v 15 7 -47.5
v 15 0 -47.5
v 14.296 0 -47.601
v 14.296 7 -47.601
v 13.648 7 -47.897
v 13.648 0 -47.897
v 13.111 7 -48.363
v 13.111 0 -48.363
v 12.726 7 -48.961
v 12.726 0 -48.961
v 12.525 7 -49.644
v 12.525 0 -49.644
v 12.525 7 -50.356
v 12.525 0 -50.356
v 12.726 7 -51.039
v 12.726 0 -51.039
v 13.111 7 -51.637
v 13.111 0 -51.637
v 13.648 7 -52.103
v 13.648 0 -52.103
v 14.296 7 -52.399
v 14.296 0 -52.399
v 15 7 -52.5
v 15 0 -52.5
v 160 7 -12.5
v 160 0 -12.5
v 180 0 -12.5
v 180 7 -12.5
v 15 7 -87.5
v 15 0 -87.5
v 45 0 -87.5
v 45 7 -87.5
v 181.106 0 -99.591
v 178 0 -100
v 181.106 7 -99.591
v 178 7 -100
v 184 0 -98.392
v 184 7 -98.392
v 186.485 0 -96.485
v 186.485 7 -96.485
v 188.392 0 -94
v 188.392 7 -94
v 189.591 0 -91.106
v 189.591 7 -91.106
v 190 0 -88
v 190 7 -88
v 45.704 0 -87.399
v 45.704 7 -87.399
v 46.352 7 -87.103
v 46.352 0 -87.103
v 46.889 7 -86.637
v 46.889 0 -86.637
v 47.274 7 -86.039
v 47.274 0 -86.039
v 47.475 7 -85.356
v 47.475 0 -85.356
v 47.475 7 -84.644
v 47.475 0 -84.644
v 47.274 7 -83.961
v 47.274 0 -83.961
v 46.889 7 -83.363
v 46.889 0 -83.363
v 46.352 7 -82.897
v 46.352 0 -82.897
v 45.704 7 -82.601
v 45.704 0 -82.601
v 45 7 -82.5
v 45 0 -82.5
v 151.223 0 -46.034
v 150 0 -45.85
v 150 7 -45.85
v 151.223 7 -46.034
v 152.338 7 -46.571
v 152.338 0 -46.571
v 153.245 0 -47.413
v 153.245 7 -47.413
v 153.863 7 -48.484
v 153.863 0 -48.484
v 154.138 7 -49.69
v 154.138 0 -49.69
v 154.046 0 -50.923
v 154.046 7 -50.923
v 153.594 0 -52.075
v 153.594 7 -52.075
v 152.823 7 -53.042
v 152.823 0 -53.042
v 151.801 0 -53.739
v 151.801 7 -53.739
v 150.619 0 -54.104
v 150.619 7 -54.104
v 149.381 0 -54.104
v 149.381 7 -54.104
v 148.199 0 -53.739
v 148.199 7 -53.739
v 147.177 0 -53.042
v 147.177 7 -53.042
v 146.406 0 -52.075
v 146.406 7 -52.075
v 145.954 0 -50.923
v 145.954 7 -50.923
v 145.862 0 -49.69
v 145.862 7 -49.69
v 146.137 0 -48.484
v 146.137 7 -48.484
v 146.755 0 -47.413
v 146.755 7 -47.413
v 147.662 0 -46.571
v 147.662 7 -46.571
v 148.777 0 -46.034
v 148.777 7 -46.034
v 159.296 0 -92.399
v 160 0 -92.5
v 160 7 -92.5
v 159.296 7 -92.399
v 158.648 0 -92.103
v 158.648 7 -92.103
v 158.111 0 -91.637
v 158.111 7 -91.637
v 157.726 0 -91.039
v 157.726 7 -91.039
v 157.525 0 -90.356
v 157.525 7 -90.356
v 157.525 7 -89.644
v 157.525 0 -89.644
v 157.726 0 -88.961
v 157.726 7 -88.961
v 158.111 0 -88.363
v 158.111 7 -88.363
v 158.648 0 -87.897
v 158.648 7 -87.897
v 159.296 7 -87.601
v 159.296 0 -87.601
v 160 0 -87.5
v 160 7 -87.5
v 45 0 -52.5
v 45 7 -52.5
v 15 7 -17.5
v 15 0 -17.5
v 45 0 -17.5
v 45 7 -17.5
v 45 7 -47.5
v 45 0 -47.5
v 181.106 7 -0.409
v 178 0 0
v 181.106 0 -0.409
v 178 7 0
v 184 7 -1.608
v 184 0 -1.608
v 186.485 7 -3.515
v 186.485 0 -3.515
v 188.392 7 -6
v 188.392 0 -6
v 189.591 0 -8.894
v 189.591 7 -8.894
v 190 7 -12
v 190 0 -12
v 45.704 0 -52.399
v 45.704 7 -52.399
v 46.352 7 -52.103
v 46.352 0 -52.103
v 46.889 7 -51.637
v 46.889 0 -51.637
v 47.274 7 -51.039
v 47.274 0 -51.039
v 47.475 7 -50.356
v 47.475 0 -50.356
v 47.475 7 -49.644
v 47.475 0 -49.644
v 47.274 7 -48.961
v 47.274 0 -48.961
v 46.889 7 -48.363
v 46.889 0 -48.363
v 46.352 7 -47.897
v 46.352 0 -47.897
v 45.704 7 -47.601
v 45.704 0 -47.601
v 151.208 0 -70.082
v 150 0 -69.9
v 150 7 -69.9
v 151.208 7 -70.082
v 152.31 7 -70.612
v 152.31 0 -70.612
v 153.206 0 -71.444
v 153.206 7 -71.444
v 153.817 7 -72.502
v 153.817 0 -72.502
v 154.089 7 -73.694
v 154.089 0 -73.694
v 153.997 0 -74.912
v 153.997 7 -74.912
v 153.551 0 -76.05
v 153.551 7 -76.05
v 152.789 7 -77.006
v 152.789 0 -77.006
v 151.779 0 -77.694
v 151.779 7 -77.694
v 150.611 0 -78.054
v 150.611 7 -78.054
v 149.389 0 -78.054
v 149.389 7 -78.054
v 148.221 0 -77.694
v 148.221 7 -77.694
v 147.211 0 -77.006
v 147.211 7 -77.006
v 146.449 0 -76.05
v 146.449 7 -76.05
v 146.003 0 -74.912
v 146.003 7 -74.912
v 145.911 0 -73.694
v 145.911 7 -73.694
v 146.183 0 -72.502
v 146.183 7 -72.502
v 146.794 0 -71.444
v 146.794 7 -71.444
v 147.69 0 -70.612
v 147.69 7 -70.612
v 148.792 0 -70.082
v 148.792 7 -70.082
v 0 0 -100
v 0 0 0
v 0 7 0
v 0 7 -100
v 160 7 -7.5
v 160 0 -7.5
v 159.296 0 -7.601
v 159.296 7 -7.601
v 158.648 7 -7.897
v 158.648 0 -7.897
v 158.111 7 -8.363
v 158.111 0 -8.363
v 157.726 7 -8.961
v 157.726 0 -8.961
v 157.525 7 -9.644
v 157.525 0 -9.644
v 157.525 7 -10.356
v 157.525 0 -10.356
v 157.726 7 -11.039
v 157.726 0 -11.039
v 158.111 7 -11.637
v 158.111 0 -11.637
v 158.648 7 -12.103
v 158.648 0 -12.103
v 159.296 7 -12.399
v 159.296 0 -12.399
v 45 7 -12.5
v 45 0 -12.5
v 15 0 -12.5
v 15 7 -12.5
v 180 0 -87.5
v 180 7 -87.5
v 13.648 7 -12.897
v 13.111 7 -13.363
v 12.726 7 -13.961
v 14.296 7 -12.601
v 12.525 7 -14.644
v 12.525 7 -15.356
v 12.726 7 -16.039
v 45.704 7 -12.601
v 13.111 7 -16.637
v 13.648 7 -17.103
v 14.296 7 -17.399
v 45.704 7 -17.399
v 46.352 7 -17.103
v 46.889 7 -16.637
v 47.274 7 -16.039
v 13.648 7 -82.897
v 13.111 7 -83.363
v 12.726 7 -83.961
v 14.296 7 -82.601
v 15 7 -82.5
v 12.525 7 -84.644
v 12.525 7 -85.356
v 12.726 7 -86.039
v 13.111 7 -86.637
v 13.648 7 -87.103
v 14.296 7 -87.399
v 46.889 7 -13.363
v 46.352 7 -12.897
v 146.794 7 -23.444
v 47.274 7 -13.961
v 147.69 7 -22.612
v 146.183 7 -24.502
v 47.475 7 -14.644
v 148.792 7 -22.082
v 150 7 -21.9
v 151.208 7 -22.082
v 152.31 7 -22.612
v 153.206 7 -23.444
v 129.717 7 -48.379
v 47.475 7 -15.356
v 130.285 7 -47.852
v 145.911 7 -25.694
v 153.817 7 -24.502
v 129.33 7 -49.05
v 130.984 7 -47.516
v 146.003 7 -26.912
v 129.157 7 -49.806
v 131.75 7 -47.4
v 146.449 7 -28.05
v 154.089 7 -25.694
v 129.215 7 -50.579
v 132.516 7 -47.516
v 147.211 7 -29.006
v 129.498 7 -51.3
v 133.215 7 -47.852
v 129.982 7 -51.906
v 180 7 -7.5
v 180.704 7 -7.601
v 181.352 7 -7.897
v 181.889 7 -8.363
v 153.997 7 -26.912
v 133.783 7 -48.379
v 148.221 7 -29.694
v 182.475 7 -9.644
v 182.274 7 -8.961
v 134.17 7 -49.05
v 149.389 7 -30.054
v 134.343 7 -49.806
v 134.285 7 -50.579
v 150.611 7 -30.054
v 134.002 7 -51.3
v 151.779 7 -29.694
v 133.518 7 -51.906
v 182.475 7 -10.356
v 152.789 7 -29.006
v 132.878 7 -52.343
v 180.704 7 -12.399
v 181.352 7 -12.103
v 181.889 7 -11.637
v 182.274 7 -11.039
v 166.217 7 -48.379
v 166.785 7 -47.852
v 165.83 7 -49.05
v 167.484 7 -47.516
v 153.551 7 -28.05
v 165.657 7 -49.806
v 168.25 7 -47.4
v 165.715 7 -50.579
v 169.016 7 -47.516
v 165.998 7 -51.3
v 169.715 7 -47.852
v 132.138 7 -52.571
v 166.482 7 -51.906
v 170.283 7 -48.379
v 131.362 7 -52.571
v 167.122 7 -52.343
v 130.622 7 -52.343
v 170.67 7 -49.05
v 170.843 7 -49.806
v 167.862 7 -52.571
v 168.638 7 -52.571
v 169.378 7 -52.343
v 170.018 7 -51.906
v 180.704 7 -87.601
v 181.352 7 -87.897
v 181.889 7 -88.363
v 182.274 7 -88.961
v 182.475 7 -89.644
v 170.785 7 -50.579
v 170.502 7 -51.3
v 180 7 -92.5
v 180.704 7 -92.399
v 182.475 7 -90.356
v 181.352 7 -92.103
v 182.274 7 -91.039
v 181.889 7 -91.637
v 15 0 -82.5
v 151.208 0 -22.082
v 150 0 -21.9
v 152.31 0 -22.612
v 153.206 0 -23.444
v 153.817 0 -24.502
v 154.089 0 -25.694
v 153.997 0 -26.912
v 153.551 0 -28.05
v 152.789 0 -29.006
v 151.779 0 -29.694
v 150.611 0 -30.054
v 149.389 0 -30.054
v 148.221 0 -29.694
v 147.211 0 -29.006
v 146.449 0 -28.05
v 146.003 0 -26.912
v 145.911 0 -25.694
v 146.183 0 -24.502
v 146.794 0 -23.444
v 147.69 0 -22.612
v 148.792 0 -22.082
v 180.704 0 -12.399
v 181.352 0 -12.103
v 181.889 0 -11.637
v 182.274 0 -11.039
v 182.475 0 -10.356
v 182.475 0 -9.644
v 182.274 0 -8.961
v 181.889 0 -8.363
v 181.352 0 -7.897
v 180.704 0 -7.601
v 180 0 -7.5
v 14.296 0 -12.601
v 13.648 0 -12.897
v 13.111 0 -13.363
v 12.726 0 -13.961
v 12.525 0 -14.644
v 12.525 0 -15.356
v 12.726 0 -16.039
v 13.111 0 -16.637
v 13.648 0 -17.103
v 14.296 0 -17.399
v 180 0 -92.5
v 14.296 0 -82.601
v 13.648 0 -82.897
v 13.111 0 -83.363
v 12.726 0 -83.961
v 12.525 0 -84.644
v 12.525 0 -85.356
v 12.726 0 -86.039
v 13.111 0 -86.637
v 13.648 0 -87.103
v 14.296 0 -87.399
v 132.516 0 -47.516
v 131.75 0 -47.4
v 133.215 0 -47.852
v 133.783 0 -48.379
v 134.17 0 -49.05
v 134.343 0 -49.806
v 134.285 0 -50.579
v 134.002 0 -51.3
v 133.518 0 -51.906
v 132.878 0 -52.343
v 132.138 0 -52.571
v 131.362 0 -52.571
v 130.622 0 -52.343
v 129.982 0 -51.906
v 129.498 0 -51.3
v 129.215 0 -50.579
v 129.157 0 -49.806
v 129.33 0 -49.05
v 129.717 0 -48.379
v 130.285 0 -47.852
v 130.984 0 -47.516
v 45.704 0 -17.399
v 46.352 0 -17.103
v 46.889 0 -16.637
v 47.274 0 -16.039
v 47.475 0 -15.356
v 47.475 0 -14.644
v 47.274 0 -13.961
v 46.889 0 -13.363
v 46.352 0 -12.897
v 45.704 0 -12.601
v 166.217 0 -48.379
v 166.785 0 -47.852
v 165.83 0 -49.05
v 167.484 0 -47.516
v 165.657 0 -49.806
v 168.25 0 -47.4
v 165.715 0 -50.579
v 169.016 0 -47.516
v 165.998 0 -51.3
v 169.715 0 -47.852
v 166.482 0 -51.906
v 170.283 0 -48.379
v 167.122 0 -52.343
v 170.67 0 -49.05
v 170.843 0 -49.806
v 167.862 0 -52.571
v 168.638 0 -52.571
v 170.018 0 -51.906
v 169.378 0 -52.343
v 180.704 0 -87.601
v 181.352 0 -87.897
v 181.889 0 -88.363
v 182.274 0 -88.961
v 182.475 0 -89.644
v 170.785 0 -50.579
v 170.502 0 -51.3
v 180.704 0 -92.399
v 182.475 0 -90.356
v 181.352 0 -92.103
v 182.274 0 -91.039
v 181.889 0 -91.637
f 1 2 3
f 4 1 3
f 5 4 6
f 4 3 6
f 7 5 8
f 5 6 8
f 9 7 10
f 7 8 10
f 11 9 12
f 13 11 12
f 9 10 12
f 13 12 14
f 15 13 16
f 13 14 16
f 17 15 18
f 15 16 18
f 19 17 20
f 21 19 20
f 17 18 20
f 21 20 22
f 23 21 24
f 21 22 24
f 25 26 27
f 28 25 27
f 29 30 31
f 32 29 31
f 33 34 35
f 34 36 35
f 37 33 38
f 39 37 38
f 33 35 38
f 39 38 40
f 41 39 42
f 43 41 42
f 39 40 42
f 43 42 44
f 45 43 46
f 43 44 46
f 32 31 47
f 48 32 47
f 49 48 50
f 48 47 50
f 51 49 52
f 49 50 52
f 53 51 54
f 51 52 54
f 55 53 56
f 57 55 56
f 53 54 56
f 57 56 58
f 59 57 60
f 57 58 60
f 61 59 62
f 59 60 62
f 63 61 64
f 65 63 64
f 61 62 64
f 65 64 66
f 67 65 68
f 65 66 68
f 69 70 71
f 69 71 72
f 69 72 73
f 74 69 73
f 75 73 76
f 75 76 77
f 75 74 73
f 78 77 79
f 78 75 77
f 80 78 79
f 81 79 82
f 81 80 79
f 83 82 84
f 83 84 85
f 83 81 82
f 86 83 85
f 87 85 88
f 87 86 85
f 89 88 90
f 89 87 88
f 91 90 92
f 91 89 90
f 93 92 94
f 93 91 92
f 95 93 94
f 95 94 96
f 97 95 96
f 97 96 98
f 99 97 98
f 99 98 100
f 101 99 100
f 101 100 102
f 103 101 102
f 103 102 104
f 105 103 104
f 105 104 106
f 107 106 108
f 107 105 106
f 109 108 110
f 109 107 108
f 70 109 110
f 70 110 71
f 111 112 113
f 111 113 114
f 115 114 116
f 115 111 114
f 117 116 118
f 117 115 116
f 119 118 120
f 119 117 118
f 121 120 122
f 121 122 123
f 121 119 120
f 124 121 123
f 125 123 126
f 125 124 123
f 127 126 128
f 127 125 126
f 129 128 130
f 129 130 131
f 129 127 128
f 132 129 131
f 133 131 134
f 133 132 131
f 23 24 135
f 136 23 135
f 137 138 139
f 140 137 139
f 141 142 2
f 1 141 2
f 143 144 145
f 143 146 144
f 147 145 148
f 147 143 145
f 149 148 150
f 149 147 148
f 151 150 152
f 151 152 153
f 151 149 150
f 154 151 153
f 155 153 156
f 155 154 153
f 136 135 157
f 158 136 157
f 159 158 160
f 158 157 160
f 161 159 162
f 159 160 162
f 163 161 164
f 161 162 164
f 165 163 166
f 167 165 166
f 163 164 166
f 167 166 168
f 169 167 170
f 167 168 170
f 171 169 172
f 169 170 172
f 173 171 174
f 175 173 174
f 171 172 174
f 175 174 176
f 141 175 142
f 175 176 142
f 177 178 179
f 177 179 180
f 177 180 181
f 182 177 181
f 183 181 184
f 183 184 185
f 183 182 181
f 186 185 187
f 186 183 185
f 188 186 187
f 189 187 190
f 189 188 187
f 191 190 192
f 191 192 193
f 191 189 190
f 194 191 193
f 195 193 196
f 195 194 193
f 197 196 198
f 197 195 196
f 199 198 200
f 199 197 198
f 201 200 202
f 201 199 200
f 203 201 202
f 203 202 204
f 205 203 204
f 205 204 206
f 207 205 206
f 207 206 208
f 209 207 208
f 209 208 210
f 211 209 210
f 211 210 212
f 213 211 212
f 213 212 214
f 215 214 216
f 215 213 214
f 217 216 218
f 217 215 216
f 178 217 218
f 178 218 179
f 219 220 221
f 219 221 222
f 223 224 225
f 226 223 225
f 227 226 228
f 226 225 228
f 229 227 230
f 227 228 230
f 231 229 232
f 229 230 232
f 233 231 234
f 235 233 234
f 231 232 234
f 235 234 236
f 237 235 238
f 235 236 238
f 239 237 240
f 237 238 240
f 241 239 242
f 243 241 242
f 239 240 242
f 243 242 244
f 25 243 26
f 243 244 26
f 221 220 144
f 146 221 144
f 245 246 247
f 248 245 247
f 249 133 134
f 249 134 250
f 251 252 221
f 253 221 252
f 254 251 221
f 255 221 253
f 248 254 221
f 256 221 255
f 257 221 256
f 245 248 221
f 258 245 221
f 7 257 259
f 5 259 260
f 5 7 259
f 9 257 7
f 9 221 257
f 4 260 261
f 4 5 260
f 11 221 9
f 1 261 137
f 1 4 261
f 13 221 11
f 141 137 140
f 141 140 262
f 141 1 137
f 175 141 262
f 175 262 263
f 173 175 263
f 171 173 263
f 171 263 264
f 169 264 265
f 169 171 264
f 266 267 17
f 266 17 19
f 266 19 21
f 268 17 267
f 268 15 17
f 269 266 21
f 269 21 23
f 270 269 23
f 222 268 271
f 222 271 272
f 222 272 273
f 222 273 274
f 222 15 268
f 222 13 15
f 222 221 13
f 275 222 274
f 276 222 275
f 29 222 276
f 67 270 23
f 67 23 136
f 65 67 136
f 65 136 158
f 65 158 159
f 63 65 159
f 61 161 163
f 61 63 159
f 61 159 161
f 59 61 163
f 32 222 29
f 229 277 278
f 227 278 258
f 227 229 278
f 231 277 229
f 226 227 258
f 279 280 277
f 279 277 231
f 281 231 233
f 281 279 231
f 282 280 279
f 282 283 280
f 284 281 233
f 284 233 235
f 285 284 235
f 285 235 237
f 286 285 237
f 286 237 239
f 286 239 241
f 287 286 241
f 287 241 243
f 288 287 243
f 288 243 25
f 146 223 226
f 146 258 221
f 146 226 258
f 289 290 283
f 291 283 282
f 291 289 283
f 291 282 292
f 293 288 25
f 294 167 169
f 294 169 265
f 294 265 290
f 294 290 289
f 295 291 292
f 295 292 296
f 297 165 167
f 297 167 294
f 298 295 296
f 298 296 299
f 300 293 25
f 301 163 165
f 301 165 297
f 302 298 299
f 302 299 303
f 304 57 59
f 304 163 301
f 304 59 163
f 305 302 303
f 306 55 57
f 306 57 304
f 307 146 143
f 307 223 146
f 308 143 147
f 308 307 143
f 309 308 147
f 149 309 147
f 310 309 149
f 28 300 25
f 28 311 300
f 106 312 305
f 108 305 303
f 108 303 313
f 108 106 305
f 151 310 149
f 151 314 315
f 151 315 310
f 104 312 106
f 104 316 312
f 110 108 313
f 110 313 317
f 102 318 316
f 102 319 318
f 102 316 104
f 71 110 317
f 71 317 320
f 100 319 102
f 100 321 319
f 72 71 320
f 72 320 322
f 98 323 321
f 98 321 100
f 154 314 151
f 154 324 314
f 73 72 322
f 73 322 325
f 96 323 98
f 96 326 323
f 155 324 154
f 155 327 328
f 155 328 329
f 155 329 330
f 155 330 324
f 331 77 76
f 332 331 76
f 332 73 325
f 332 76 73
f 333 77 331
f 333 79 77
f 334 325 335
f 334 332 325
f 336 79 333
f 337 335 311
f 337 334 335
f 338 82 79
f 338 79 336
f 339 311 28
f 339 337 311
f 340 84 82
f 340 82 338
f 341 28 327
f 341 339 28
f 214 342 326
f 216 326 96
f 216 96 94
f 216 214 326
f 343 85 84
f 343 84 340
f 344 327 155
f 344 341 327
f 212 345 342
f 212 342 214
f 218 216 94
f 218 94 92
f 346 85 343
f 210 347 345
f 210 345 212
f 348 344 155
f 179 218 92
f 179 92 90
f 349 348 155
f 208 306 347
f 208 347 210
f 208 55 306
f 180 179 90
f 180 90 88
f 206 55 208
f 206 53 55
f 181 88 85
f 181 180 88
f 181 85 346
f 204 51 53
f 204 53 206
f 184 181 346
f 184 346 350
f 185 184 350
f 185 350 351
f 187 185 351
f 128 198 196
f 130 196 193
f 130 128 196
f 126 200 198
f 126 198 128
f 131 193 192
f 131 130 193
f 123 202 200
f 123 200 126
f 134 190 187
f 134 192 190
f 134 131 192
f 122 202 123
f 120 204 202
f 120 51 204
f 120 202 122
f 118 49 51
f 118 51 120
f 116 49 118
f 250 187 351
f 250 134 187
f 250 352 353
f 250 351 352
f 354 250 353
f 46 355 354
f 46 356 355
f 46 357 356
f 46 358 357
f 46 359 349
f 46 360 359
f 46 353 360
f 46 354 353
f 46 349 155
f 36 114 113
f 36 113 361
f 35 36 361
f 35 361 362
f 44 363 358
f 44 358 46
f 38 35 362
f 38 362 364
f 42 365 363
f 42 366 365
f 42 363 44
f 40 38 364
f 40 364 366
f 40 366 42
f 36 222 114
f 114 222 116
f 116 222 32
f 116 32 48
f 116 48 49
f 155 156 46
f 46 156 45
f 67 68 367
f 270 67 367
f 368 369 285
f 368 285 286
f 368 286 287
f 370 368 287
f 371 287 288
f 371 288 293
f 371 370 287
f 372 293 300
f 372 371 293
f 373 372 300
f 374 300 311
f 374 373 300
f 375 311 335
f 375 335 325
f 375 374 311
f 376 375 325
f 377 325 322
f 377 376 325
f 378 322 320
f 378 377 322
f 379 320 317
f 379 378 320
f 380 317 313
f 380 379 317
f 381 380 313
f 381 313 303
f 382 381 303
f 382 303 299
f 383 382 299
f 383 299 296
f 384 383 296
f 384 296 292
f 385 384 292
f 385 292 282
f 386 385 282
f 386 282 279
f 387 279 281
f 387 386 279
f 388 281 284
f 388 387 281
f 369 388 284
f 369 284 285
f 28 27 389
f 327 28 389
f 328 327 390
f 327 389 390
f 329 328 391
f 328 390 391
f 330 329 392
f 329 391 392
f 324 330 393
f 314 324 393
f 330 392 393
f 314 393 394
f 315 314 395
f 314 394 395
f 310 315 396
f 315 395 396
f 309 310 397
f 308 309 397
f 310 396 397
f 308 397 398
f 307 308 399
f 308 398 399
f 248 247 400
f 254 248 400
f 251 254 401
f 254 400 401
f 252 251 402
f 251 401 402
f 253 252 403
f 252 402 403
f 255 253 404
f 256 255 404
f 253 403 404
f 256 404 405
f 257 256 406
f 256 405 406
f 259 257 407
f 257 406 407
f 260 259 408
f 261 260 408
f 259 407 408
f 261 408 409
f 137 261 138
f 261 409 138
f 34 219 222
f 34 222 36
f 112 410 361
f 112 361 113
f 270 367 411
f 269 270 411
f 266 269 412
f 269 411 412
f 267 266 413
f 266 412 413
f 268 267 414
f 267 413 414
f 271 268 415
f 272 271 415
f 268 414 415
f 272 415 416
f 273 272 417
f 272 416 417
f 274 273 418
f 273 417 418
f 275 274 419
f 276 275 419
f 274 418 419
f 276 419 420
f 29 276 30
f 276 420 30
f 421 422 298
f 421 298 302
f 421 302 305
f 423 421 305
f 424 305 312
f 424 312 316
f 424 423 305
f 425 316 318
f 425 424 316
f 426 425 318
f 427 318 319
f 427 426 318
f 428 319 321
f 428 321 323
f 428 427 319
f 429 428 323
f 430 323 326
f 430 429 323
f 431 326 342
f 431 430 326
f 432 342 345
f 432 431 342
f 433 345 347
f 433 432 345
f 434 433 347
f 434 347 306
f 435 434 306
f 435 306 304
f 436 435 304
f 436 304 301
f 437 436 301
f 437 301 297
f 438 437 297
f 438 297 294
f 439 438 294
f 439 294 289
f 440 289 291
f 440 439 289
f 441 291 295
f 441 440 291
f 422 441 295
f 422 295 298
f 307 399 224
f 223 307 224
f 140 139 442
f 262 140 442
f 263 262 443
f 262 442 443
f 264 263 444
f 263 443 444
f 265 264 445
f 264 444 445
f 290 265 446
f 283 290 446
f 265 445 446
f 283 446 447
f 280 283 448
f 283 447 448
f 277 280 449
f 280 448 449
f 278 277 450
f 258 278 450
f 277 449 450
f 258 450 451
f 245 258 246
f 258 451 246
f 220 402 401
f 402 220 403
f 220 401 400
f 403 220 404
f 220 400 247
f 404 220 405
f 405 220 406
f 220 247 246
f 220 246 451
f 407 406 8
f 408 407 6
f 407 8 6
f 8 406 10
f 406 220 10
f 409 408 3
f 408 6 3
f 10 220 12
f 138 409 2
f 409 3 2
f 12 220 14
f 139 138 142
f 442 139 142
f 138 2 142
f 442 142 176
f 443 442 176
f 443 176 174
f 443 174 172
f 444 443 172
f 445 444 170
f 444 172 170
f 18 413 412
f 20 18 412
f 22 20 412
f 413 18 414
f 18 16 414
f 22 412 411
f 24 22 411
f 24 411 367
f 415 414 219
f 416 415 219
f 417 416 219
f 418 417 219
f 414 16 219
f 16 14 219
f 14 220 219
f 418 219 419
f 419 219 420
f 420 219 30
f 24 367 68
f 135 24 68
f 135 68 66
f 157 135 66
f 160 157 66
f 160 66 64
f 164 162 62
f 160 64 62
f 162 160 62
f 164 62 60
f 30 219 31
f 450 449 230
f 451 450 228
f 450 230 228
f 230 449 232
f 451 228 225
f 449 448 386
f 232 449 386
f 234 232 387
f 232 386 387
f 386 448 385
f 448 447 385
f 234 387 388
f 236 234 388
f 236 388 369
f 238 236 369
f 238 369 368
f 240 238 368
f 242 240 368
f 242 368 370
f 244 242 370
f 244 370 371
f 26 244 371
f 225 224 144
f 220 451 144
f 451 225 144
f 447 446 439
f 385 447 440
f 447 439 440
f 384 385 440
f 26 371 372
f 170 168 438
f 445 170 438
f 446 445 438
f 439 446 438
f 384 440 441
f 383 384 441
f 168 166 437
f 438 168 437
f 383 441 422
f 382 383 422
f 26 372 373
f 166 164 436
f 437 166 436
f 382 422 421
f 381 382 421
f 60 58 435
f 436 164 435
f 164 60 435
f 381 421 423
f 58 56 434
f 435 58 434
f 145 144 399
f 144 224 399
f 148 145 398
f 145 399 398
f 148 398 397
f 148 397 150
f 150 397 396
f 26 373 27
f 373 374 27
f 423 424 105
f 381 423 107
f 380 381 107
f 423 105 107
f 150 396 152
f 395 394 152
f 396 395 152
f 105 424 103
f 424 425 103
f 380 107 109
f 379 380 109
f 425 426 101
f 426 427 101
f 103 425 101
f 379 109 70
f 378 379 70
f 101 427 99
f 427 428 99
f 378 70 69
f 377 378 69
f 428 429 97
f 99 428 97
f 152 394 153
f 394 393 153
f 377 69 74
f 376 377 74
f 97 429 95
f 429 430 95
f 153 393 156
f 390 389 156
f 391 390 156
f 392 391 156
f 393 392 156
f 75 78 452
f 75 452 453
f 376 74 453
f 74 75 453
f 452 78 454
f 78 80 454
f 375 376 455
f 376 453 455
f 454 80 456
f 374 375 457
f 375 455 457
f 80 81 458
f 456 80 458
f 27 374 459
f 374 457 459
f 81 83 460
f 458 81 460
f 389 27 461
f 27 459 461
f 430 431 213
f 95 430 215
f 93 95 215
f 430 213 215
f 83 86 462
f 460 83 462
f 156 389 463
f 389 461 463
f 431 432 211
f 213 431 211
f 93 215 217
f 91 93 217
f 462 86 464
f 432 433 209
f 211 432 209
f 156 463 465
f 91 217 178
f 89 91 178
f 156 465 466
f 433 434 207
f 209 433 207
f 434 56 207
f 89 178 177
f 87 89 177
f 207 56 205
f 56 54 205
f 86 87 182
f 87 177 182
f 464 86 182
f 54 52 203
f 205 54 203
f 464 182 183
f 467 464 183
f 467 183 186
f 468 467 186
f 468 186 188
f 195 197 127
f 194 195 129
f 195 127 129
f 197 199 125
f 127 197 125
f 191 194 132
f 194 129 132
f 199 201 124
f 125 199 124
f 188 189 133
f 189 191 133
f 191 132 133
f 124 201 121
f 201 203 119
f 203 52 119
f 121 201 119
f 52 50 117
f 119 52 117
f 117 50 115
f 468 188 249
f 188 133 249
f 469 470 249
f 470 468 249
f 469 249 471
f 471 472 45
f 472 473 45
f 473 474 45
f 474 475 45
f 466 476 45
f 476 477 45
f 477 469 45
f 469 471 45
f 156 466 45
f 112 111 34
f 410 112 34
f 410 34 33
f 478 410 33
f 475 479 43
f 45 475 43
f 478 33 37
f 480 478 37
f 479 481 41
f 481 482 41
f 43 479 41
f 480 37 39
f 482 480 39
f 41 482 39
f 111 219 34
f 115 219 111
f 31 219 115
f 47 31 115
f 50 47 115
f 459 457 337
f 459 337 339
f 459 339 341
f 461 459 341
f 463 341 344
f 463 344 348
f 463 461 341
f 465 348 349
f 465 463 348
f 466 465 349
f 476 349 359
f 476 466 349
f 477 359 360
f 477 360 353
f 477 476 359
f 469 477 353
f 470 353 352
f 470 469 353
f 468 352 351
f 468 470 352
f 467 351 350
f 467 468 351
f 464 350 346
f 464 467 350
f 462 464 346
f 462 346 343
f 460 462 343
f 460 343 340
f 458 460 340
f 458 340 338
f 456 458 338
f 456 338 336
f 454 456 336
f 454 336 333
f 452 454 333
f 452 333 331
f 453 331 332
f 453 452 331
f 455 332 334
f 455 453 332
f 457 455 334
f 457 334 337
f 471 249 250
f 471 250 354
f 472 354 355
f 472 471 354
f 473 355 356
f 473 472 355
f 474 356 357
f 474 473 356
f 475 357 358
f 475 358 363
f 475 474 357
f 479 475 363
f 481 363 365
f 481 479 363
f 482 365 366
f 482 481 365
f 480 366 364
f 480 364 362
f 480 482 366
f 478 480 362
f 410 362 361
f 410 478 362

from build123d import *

# Parameters (mm, degrees)
SKETCH1_W           = 190
SKETCH1_H           = 100
SKETCH1_R           = 4.15
SKETCH1_R_2         = 4.1
SKETCH1_R_3         = 2.6
BOSS_EXTRUDE1_DEPTH = 7
FILLET3_R           = 12


with BuildPart() as part:
    # Sketch1 → Boss-Extrude1 (new body)
    with BuildSketch(Plane(origin=(0, 0, 0), x_dir=(1, 0, 0), z_dir=(0, 1, 0))):
        with Locations((95, 50)):
            Rectangle(SKETCH1_W, SKETCH1_H)
        with Locations(Location((150, 50, 0), (0, 0, 270))):
            Circle(SKETCH1_R, mode=Mode.SUBTRACT)
        with Locations(Location((150, 74, 0), (0, 0, 270))):
            Circle(SKETCH1_R_2, mode=Mode.SUBTRACT)
        with Locations(Location((131.75, 50, 0), (0, 0, 270))):
            Circle(SKETCH1_R_3, mode=Mode.SUBTRACT)
        with Locations(Location((168.25, 50, 0), (0, 0, 270))):
            Circle(SKETCH1_R_3, mode=Mode.SUBTRACT)
        with Locations(Location((150, 26, 0), (0, 0, 270))):
            Circle(SKETCH1_R_2, mode=Mode.SUBTRACT)
        with BuildLine():
            Line((160, 12.5), (180, 12.5))
            ThreePointArc((180, 12.5), (182.5, 10), (180, 7.5))
            Line((180, 7.5), (160, 7.5))
            ThreePointArc((160, 7.5), (157.5, 10), (160, 12.5))
        make_face(mode=Mode.SUBTRACT)
        with BuildLine():
            Line((160, 87.5), (180, 87.5))
            ThreePointArc((180, 87.5), (182.5, 90), (180, 92.5))
            Line((180, 92.5), (160, 92.5))
            ThreePointArc((160, 92.5), (157.5, 90), (160, 87.5))
        make_face(mode=Mode.SUBTRACT)
        with BuildLine():
            Line((15, 87.5), (45, 87.5))
            ThreePointArc((45, 87.5), (47.5, 85), (45, 82.5))
            Line((45, 82.5), (15, 82.5))
            ThreePointArc((15, 82.5), (12.5, 85), (15, 87.5))
        make_face(mode=Mode.SUBTRACT)
        with BuildLine():
            Line((15, 52.5), (45, 52.5))
            ThreePointArc((45, 52.5), (47.5, 50), (45, 47.5))
            Line((45, 47.5), (15, 47.5))
            ThreePointArc((15, 47.5), (12.5, 50), (15, 52.5))
        make_face(mode=Mode.SUBTRACT)
        with BuildLine():
            Line((15, 17.5), (45, 17.5))
            ThreePointArc((45, 17.5), (47.5, 15), (45, 12.5))
            Line((45, 12.5), (15, 12.5))
            ThreePointArc((15, 12.5), (12.5, 15), (15, 17.5))
        make_face(mode=Mode.SUBTRACT)
    extrude(amount=BOSS_EXTRUDE1_DEPTH)

    # Fillet3
    fillet3_edges = [part.edges().sort_by_distance(p)[0] for p in [
        (190, 3.5, -100),
        (190, 3.5, 0),
    ]]
    fillet(fillet3_edges, radius=FILLET3_R)


solid = part.part
